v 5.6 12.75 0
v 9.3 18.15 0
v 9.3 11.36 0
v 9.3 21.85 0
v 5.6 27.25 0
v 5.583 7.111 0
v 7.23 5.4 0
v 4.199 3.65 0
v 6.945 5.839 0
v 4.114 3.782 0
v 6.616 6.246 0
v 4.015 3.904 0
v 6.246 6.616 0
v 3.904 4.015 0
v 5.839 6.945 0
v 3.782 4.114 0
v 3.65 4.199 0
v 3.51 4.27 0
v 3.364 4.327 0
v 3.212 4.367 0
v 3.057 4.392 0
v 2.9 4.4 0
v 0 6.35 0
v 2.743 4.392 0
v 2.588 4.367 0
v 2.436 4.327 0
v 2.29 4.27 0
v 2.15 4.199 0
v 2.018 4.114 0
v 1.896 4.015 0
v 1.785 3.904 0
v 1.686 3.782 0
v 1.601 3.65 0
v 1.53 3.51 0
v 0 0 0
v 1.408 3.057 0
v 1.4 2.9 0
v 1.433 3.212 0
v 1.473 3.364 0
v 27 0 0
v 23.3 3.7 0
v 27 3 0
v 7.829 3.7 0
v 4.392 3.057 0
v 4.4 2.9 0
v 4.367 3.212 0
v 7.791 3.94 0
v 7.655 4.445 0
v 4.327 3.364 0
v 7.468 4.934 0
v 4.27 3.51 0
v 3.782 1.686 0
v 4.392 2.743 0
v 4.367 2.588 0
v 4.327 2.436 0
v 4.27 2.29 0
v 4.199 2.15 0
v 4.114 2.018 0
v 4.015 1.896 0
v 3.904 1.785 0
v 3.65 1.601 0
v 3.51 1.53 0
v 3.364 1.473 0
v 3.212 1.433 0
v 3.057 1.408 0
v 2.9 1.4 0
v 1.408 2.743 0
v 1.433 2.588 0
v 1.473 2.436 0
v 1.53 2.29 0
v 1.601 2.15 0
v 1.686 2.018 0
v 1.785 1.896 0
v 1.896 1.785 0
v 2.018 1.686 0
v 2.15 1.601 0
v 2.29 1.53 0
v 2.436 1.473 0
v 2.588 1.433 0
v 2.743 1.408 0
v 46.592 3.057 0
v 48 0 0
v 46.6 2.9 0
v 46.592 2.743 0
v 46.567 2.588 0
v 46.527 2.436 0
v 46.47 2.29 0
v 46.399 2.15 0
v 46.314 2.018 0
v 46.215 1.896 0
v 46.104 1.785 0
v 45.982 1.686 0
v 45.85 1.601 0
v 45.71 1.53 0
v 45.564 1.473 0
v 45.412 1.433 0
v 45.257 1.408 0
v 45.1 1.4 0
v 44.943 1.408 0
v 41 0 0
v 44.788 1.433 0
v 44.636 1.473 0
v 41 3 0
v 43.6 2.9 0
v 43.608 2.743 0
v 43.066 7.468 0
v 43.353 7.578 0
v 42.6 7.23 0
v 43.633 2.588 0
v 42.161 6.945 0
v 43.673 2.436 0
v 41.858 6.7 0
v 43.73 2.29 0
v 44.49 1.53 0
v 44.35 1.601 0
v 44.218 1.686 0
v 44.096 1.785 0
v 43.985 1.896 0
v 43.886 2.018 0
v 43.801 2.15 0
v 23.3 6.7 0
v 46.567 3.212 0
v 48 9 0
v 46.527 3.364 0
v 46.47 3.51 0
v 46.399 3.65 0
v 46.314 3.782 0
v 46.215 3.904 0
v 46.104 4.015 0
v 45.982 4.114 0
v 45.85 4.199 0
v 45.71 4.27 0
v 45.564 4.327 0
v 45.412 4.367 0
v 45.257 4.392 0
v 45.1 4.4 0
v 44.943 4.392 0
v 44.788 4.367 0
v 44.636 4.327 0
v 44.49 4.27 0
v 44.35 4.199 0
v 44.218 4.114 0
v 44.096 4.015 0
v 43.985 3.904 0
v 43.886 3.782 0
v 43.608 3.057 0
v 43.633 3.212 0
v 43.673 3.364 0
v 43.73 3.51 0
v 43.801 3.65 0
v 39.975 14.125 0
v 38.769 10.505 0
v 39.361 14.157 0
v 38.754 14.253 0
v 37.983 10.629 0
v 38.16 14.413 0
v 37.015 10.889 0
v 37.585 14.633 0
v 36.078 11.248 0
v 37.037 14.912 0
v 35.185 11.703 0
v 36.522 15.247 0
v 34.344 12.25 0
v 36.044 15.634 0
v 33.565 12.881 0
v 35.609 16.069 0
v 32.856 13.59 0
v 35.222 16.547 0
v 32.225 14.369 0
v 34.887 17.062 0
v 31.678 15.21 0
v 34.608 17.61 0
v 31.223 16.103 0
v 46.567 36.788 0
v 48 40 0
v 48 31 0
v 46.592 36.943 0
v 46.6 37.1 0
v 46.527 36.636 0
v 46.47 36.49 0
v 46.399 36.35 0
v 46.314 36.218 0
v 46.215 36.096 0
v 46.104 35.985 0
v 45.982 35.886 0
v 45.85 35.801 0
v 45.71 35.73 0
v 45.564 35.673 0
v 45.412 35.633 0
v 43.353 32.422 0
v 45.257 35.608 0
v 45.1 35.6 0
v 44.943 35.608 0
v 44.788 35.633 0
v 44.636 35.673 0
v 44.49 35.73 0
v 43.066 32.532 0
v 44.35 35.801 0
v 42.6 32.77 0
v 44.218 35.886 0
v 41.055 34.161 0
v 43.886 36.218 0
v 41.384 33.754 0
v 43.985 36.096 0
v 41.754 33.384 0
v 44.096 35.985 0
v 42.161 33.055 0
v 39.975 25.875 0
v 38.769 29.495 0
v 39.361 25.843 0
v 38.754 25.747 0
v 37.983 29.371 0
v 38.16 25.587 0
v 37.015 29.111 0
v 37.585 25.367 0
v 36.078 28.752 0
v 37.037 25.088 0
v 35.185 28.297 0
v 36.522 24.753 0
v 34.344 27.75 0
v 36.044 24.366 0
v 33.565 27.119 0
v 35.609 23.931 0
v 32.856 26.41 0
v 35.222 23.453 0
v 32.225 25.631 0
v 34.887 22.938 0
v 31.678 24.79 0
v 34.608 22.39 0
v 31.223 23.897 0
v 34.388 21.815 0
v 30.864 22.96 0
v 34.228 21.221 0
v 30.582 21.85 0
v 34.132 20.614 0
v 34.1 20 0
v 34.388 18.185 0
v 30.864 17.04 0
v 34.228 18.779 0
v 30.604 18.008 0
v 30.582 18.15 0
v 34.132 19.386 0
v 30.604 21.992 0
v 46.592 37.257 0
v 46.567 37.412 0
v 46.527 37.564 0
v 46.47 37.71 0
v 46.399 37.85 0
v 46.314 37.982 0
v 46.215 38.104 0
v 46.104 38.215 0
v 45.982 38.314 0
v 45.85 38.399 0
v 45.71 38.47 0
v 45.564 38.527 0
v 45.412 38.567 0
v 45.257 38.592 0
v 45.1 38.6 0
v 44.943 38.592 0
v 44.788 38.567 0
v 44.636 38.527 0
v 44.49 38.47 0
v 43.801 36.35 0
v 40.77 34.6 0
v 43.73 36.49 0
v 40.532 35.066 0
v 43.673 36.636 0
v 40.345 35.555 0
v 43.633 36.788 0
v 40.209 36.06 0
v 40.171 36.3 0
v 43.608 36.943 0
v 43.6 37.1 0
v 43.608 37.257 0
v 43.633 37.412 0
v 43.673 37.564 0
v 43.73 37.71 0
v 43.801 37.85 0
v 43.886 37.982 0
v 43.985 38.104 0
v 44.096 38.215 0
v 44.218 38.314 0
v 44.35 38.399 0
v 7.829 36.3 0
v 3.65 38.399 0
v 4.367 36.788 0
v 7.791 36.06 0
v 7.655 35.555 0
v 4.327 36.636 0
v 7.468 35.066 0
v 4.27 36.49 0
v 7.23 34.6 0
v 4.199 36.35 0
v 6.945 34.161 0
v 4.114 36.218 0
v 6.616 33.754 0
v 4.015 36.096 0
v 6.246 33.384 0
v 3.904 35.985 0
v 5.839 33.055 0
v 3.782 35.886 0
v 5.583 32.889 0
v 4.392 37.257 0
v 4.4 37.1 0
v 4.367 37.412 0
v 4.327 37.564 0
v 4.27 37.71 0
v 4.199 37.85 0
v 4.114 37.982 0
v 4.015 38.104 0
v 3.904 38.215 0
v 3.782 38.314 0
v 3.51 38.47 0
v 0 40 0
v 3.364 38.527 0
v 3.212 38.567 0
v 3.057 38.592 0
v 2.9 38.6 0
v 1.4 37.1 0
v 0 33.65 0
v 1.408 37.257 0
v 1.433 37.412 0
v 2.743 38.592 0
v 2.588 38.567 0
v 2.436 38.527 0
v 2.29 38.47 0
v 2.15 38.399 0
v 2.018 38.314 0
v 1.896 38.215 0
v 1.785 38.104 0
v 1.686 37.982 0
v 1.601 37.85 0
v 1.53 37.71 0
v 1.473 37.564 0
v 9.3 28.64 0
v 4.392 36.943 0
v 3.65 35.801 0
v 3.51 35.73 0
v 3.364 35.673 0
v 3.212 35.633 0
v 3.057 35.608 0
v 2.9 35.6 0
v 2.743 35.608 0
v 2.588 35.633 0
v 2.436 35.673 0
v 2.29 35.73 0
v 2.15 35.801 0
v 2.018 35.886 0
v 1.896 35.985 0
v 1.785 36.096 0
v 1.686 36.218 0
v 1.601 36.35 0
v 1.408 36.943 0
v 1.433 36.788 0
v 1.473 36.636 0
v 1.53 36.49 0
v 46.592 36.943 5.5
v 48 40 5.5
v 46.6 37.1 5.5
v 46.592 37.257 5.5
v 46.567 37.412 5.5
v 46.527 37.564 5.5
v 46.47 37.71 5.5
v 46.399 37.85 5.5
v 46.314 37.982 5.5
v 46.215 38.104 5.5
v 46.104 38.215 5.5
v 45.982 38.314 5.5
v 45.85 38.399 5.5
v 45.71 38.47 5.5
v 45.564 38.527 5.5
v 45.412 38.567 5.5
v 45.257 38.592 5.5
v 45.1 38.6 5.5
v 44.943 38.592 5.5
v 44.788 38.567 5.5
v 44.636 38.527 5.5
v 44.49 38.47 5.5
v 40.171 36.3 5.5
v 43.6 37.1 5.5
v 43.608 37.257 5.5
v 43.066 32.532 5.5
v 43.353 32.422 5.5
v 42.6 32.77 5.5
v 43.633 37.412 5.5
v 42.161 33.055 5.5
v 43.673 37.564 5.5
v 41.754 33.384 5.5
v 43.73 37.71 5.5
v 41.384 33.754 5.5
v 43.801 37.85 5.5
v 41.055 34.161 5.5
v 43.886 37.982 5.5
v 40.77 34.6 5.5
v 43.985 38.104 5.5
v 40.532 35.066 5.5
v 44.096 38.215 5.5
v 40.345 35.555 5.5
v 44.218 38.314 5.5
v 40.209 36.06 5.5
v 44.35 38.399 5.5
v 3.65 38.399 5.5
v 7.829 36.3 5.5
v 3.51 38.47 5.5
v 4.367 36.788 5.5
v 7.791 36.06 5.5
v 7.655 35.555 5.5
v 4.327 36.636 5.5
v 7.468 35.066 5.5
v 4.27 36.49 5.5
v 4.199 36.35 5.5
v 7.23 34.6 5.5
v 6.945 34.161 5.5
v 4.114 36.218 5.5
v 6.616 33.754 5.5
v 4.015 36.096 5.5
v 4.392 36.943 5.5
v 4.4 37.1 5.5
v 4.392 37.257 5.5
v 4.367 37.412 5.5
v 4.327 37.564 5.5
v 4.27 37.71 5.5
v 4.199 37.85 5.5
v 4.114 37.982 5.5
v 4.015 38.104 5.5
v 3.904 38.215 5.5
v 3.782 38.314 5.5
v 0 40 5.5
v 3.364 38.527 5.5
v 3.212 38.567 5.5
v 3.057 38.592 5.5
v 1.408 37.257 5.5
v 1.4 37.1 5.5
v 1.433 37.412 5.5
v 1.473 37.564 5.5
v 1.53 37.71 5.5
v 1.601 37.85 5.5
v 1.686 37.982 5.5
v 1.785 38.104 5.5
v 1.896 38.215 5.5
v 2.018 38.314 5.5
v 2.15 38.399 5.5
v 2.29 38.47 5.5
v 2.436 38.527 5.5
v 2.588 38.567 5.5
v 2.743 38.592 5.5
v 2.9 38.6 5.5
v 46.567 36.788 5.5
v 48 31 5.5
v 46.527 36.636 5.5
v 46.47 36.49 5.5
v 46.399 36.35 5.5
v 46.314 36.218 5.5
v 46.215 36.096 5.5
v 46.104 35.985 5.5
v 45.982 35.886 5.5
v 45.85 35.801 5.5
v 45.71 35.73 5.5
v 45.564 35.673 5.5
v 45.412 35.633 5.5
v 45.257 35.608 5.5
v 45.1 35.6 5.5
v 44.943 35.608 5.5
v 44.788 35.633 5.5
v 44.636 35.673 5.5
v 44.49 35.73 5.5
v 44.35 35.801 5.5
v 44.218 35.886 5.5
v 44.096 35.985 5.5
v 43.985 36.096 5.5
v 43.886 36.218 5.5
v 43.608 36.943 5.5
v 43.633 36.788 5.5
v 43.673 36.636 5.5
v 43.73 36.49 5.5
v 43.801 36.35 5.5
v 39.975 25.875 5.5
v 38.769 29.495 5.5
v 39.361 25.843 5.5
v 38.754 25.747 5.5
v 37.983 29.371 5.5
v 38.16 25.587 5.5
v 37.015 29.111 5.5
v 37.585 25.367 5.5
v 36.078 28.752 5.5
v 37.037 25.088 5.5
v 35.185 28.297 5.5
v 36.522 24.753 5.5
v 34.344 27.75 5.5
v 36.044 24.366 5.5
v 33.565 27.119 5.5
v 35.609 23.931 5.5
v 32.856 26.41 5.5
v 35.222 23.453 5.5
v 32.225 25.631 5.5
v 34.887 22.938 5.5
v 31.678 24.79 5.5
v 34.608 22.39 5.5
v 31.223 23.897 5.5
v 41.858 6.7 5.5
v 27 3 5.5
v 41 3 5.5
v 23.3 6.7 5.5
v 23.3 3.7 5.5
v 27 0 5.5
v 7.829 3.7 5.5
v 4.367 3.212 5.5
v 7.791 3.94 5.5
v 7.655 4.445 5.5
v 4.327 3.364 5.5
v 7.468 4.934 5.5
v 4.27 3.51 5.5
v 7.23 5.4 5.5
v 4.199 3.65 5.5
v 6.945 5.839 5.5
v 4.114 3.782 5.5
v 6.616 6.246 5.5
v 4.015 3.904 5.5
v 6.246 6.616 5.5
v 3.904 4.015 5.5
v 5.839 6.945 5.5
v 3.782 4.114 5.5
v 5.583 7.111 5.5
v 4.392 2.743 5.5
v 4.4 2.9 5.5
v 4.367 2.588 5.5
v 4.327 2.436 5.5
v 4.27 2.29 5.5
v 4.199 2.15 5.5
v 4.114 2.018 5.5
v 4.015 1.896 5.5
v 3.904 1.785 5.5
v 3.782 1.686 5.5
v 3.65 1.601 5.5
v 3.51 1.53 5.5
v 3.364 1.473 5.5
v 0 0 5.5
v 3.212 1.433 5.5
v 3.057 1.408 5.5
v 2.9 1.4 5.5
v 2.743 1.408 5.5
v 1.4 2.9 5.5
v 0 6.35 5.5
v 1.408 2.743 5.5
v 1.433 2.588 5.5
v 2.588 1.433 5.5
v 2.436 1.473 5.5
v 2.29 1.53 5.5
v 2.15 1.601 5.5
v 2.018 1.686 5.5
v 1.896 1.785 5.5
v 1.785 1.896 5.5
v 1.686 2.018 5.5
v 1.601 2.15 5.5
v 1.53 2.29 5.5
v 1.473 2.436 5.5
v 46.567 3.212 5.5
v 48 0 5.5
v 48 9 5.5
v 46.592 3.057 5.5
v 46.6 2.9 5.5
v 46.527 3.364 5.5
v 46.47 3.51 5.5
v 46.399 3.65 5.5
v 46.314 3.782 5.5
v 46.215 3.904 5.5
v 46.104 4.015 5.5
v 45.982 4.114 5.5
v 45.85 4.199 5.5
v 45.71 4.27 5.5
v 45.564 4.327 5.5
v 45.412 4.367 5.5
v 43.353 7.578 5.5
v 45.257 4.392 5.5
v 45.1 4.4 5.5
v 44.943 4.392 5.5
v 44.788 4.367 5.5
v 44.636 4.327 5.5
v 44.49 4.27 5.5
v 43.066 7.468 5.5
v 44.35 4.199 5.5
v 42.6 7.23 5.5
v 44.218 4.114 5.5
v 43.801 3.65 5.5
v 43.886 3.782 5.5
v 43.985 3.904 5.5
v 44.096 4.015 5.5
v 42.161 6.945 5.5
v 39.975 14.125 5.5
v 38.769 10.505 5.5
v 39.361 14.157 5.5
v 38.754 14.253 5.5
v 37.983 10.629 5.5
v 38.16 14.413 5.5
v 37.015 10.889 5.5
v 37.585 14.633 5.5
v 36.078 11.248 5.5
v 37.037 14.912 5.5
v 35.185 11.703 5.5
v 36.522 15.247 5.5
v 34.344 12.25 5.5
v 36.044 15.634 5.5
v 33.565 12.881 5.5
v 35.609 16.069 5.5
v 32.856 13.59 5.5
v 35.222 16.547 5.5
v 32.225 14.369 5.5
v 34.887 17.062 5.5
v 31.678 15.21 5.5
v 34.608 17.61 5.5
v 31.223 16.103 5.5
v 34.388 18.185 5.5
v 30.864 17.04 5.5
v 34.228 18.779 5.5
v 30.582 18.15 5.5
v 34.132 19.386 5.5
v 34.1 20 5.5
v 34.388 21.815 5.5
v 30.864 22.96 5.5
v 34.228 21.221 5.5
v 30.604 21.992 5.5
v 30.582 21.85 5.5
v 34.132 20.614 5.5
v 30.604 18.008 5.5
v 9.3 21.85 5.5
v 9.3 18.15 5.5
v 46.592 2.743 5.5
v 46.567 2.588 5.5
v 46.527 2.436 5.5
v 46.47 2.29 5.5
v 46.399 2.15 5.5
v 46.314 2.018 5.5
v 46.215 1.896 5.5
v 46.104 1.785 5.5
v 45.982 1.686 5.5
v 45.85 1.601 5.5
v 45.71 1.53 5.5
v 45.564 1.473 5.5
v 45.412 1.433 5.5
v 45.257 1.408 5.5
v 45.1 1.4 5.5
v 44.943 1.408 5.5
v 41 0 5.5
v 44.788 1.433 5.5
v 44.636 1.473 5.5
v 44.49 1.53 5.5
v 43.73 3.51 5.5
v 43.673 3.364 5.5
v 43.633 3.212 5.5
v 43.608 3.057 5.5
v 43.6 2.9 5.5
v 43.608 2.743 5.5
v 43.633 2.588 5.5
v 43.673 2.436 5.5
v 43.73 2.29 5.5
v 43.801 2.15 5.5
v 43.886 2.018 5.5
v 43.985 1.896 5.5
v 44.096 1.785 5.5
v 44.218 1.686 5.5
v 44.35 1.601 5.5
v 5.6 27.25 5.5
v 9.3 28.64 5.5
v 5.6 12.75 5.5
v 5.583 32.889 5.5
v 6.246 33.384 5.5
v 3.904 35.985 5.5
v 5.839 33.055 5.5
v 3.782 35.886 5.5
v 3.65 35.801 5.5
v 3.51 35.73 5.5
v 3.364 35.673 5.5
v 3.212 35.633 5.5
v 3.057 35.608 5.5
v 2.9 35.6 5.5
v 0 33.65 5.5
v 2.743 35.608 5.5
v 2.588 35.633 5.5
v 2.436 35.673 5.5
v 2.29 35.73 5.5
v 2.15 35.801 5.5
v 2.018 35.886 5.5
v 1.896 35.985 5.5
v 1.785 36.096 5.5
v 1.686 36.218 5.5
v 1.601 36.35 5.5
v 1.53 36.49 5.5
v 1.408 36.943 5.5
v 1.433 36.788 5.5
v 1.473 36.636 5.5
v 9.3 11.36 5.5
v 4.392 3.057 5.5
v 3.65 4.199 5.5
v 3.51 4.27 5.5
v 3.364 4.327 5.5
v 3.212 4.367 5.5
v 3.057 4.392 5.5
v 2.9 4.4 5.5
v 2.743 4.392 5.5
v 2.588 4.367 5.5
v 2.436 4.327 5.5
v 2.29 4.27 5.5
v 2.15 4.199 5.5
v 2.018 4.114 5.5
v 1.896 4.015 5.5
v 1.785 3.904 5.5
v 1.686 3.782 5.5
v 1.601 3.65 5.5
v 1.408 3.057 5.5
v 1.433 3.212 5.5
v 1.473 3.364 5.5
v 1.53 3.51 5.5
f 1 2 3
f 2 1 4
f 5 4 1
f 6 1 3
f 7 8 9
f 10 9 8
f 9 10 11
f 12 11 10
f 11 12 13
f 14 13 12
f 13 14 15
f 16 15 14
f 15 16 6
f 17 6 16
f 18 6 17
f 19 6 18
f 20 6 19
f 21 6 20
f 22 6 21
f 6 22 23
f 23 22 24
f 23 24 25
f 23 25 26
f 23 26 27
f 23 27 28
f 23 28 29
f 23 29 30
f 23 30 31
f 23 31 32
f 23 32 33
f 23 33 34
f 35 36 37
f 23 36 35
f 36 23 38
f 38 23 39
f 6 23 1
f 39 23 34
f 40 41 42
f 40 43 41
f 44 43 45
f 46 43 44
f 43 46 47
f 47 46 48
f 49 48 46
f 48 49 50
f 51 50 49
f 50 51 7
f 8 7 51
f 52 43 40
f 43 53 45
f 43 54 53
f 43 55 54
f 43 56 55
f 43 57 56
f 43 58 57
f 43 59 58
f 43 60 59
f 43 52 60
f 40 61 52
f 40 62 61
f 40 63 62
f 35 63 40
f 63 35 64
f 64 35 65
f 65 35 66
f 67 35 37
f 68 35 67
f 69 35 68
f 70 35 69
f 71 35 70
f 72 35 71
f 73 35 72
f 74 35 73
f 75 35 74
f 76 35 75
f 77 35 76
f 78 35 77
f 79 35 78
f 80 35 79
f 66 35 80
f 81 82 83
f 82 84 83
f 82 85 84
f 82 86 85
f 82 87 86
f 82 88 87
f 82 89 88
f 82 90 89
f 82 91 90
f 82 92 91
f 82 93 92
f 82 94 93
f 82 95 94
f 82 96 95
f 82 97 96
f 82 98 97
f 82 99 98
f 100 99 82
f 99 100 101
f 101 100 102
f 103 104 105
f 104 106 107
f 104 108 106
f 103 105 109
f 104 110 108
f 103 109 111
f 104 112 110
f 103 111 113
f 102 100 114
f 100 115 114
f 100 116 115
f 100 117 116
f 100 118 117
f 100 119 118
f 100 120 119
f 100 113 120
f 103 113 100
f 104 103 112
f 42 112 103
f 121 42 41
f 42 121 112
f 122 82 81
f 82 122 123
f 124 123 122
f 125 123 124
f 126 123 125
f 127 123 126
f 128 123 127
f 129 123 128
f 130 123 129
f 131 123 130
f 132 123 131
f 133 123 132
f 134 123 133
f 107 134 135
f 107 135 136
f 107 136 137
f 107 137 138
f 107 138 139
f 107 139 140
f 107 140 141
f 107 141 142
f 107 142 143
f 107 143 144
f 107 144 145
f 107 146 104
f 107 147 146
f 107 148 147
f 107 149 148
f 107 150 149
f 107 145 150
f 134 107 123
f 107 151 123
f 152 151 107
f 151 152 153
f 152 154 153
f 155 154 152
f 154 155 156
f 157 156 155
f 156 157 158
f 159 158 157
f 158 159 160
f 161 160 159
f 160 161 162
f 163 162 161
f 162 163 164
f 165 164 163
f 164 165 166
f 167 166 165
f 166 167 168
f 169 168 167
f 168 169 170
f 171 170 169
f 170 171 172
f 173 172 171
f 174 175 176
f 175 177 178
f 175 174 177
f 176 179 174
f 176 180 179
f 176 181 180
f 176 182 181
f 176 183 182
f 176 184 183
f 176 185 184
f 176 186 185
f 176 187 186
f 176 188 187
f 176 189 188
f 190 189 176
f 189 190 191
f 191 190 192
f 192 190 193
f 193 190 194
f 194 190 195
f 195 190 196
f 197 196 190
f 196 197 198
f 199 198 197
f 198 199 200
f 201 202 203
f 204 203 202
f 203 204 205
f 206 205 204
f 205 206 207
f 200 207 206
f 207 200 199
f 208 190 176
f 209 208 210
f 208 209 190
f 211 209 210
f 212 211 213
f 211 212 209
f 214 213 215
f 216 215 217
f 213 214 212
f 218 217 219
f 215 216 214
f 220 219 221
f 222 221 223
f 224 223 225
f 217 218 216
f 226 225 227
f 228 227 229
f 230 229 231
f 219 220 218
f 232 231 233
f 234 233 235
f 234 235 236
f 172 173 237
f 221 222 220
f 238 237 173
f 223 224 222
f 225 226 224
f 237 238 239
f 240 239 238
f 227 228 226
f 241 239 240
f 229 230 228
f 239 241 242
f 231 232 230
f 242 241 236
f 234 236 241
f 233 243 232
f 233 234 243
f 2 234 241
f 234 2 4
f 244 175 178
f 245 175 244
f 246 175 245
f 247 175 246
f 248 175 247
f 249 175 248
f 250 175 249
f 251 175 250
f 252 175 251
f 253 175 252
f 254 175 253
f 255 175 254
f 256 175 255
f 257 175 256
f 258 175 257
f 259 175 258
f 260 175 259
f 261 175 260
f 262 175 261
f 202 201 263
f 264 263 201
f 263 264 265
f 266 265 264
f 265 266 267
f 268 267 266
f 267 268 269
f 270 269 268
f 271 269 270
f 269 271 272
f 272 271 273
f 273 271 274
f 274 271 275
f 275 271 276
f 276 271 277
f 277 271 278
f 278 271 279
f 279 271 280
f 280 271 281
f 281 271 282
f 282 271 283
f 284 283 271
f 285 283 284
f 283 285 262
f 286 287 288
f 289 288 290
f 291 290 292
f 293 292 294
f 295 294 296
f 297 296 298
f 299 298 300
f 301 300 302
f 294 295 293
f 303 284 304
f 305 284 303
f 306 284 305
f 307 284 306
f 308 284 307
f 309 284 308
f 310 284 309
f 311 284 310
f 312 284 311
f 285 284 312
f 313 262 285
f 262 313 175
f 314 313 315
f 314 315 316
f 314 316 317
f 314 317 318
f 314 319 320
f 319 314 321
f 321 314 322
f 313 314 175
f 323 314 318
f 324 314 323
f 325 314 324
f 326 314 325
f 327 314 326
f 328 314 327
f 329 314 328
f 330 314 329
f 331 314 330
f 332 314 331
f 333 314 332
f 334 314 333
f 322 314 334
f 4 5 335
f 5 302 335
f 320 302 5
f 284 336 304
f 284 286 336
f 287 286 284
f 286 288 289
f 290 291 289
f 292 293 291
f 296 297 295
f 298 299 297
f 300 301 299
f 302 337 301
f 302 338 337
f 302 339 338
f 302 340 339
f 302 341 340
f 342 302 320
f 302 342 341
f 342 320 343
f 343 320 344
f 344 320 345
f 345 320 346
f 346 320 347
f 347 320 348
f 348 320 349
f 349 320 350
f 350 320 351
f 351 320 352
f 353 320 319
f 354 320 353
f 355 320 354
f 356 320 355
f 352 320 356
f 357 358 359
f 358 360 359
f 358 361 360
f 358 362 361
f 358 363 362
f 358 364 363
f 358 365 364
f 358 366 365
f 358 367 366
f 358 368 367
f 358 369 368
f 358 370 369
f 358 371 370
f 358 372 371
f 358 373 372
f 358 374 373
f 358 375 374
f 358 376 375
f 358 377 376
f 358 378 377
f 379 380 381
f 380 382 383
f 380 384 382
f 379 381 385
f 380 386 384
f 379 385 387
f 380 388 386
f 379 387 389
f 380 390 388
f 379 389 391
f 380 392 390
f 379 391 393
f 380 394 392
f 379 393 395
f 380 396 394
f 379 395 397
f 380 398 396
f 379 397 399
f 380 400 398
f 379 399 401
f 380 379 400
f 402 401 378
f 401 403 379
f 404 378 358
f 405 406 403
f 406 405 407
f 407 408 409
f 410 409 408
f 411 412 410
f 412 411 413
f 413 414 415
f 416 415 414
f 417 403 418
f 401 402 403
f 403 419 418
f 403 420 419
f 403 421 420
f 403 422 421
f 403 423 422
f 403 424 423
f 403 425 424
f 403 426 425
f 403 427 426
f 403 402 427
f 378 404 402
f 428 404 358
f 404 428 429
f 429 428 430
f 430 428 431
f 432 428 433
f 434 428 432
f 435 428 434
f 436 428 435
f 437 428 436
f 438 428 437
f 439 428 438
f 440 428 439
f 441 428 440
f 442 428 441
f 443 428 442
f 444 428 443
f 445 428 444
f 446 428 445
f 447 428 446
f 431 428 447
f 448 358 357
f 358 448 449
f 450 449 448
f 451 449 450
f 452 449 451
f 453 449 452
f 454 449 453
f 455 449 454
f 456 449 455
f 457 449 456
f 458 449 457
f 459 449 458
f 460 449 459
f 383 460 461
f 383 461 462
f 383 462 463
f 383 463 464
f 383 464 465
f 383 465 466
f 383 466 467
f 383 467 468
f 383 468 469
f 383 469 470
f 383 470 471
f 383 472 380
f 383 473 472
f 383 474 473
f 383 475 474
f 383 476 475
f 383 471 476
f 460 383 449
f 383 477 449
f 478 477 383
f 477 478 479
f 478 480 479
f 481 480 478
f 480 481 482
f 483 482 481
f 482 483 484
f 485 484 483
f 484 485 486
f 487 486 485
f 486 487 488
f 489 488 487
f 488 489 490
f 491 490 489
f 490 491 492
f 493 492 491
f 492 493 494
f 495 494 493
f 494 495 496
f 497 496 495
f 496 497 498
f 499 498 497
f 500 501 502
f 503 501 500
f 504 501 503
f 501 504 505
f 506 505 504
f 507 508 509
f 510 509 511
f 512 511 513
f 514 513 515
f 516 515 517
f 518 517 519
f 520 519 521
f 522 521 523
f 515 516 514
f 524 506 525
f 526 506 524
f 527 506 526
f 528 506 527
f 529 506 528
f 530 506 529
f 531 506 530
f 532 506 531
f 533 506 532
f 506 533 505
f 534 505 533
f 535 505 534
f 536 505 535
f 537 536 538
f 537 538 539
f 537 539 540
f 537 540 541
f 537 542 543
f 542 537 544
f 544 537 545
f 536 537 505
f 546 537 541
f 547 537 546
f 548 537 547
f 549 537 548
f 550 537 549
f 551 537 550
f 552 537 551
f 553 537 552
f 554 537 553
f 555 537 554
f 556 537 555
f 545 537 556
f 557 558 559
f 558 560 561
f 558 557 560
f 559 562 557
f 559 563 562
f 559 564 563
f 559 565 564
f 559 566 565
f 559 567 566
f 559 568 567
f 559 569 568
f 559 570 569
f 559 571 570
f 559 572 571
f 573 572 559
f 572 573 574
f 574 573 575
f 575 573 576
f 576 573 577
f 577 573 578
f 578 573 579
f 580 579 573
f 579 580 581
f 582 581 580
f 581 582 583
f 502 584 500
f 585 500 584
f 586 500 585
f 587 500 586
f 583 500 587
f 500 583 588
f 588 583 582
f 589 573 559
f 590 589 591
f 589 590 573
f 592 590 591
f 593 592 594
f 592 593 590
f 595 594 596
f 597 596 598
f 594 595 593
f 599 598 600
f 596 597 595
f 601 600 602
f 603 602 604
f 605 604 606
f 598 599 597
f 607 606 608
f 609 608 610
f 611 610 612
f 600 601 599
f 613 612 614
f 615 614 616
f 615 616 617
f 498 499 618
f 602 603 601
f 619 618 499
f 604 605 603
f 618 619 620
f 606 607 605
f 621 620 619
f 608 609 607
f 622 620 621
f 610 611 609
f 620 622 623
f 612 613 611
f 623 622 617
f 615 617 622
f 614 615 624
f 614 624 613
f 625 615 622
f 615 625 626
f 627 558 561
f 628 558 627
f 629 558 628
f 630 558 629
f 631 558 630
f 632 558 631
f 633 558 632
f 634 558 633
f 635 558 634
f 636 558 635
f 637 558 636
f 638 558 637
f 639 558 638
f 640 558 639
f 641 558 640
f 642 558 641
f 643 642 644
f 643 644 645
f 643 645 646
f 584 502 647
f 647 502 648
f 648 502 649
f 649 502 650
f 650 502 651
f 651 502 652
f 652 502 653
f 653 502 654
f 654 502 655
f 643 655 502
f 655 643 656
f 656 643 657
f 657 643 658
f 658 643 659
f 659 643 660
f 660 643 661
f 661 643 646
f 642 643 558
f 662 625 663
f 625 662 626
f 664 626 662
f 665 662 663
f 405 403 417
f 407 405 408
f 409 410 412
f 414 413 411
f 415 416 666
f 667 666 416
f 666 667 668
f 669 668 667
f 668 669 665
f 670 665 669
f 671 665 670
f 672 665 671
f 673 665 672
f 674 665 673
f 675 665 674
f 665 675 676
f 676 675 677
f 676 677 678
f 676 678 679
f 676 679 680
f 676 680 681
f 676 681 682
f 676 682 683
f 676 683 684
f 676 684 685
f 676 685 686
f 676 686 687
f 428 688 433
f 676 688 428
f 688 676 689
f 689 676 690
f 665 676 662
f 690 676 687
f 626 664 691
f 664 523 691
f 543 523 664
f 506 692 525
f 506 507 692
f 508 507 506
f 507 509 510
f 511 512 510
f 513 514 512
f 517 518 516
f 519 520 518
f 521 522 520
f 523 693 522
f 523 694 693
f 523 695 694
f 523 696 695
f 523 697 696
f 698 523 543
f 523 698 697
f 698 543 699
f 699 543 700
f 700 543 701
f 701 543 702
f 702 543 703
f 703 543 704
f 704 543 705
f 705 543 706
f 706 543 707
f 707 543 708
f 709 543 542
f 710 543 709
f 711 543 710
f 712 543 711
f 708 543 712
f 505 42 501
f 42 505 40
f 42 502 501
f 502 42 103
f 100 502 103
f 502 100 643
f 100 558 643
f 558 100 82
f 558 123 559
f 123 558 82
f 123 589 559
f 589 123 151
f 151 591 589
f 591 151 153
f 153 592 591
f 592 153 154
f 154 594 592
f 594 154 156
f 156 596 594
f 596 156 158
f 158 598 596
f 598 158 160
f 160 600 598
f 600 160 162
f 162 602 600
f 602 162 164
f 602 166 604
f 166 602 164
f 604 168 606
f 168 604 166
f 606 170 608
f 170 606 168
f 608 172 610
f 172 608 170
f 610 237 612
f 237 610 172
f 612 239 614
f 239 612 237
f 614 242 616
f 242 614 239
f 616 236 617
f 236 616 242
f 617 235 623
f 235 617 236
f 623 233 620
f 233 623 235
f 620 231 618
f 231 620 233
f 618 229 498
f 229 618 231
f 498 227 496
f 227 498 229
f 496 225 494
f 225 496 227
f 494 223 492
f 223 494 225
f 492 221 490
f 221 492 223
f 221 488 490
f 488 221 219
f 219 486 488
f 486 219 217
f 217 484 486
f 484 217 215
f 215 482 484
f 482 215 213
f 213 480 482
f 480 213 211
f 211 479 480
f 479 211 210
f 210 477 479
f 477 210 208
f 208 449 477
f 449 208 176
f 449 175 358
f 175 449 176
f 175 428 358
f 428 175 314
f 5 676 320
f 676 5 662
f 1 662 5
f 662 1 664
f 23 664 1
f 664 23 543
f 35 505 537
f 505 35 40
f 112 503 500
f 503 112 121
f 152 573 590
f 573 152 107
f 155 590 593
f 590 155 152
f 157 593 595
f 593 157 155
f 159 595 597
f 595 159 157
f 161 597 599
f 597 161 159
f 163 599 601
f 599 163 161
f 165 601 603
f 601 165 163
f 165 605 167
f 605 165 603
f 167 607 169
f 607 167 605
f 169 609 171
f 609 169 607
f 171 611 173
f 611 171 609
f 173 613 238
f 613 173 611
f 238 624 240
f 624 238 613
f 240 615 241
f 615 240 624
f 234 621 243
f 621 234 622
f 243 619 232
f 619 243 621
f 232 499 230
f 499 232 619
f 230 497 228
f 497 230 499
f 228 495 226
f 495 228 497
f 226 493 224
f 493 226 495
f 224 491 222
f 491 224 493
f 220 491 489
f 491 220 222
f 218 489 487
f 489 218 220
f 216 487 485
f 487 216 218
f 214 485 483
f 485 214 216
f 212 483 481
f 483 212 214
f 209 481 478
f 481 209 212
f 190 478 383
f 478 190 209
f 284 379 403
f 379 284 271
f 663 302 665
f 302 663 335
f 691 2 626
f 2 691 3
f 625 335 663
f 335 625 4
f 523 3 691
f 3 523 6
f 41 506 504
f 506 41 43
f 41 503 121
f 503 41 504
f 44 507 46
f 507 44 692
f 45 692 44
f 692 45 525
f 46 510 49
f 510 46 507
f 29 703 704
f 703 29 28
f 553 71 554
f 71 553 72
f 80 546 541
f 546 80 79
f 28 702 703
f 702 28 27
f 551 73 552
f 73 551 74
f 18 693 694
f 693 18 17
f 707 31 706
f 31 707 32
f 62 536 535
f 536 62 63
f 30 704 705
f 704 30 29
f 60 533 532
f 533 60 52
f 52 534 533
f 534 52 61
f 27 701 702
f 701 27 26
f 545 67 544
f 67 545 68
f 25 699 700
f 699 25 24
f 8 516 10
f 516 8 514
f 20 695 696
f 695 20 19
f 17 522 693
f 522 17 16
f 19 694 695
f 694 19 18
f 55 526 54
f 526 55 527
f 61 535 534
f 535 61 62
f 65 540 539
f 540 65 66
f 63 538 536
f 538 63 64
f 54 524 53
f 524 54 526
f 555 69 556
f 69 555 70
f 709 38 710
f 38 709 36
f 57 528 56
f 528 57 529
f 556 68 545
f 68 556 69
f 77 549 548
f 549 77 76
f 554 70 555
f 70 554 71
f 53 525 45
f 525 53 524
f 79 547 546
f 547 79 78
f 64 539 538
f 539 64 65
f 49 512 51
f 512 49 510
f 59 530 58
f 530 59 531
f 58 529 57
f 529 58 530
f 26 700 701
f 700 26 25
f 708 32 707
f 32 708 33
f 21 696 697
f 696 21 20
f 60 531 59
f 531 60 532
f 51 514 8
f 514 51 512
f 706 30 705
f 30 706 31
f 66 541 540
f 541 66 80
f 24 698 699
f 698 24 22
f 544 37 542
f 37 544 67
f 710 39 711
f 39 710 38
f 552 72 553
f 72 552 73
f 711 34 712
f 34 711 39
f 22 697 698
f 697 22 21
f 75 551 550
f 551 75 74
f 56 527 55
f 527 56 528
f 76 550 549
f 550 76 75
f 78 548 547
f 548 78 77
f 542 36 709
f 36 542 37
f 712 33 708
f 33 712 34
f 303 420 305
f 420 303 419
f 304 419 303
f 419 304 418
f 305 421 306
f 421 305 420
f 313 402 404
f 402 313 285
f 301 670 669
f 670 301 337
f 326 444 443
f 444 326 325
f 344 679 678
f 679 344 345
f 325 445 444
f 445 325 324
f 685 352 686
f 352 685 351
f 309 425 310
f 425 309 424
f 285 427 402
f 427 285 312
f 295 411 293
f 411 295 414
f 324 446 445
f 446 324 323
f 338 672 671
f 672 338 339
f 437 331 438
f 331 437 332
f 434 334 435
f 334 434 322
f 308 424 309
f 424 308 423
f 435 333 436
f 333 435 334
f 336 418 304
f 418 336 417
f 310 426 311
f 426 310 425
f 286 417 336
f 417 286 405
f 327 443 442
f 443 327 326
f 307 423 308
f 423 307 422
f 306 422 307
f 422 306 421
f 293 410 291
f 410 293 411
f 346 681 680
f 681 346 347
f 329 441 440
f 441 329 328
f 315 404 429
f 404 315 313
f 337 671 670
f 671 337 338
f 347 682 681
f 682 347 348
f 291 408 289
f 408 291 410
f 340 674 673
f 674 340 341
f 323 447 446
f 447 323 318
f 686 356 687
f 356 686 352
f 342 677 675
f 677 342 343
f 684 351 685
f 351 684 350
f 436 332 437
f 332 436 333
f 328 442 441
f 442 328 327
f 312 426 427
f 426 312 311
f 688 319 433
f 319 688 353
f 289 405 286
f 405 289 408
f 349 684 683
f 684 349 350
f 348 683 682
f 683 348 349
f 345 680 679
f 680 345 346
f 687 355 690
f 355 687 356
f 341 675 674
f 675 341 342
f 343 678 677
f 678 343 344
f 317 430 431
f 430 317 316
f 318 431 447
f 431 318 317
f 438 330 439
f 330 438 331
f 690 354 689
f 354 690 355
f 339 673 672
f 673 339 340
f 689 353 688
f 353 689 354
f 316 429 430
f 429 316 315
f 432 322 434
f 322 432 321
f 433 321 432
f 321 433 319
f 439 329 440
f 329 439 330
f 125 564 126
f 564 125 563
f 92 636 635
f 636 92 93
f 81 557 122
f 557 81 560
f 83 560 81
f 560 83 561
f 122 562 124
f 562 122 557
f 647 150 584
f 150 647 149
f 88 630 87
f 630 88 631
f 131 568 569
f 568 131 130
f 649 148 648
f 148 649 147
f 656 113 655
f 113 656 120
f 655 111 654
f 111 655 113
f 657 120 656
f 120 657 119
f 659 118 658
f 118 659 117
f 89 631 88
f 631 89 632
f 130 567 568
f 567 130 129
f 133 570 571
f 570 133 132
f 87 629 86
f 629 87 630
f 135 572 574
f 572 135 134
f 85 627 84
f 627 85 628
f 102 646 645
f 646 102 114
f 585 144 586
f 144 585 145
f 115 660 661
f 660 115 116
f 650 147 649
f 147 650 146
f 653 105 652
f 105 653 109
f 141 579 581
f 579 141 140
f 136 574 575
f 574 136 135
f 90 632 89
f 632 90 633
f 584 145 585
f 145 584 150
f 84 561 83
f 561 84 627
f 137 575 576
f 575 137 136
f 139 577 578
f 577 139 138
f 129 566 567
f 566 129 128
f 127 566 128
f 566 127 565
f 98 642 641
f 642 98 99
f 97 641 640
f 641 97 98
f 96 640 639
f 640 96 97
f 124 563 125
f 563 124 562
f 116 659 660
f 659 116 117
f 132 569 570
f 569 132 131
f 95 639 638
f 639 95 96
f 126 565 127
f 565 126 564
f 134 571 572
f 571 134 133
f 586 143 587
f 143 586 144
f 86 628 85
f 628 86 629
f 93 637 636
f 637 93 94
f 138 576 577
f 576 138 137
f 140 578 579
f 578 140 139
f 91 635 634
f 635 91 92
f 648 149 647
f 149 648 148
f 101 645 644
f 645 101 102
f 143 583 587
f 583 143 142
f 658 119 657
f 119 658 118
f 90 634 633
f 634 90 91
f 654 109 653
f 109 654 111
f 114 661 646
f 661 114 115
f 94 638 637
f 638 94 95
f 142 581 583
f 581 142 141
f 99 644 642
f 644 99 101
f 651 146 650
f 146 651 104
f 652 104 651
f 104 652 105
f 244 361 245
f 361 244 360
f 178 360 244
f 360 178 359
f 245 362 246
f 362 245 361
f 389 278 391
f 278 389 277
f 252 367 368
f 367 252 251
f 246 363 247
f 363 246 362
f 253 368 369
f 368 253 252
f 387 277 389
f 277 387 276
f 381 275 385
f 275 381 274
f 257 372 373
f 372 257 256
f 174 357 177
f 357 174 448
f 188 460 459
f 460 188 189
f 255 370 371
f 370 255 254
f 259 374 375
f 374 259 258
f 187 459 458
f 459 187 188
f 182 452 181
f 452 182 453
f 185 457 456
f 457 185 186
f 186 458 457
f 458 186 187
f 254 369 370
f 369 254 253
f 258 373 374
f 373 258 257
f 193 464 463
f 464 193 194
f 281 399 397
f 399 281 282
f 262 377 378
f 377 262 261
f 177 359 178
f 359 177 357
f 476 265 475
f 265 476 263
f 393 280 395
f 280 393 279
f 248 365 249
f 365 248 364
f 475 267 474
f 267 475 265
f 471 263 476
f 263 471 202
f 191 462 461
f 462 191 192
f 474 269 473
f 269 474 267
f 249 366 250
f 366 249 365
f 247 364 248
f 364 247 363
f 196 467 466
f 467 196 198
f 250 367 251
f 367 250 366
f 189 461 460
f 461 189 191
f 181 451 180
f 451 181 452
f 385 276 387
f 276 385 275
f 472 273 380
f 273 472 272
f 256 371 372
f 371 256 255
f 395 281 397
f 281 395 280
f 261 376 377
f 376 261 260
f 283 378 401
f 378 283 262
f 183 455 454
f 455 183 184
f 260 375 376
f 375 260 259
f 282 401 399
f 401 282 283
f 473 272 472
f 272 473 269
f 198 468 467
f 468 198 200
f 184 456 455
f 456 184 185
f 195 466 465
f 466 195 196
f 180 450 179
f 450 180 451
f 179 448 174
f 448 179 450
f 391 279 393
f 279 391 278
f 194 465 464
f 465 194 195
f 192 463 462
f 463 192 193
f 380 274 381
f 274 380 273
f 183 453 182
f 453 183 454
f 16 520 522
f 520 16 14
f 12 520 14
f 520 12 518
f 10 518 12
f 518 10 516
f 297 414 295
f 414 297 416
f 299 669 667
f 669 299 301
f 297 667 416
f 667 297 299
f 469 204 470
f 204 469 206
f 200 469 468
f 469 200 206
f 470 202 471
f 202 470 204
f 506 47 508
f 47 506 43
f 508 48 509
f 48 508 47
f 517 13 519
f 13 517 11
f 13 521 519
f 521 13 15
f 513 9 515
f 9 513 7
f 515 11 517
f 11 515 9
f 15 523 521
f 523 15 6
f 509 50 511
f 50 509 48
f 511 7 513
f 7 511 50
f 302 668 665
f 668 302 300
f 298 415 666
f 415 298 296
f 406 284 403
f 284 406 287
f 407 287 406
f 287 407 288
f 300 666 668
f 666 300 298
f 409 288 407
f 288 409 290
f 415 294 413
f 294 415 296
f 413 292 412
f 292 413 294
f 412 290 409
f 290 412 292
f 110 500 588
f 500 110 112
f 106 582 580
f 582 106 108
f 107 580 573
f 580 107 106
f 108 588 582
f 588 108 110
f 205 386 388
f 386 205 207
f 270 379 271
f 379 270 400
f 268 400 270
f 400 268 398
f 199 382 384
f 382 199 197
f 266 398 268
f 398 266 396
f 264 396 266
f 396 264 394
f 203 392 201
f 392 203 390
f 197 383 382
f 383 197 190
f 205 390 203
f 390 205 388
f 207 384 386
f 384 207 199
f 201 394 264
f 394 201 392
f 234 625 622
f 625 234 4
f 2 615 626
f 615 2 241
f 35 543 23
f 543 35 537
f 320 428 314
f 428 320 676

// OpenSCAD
$fn = 60;

main=[48,40];
side=[14,3];
usbTrap = [5.6, 14.5, 27.3]; // trapezoidHeight, shortLenght, longLength
nutSlotDia = 11.75;
nutSlotEdgeOffset = 13.9;
nutTrap = [nutSlotEdgeOffset-nutSlotDia/2, nutSlotDia, 22];

module mainPolygon() {
    polygon(points = [ [0,0], [main[0],0], [main[0],main[1]], [0,main[1]] ]);
};

module sidePolygon() {
    polygon(points = [ [0,0], [side[0],0], [side[0],side[1]], [0,side[1]] ]);
};

module trapezoid(dimensions=usbTrap) {
    inset = (dimensions[2]-dimensions[1])/2;
    polygon(points = [ [0,0], [dimensions[0],inset], [dimensions[0],inset+dimensions[1]], [0,dimensions[2]] ]);
};

module nutSlot(d=nutSlotDia) {
   circle(d=d);
}
//nutSlot();

module outputPolygon() {
    difference() {
        mainPolygon();
        translate([main[0]-21, 0, 0]) sidePolygon();
        translate([0,(main[1]-usbTrap[2])/2, 0]) trapezoid(usbTrap);
        translate([main[0],(main[1]-nutTrap[2])/2, 0]) rotate([0,180,0]) trapezoid(nutTrap);
        translate([main[0]-nutSlotEdgeOffset+nutSlotDia/2,main[1]/2,0]) nutSlot();
    }
};
//outputPolygon();

//pang-cut ito ng sosobrang cylinder ng mounting hole
module boundingWall(size=main, thickness=7, h=wallHeight) {
    linear_extrude(height=h) {
        difference() {
            offset(delta=thickness) outputPolygon();
            outputPolygon();
        };
    };
};
//boundingWall();

insetLength = 3.7;
module insetOutputPolygon(inset=insetLength) {
    offset(delta=-inset) {
        outputPolygon();
    };
};
//insetOutputPolygon();

wallHeight = 5.5;
module perimeterExtrude(h=wallHeight) {
    difference() {
        linear_extrude(height=h) { outputPolygon(); }
        linear_extrude(height=h) { insetOutputPolygon(); }
    }
}
//perimeterExtrude();

mountHoleEdgeOffset = 1.4;
mountHoleDiameter = 3;
holeGaps = [main[0]-mountHoleEdgeOffset*2-mountHoleDiameter, main[1]-mountHoleEdgeOffset*2-mountHoleDiameter];
//echo(holeGaps);
module mounts(gaps=holeGaps, d=mountHoleDiameter, h=wallHeight, o=mountHoleEdgeOffset) {
    for (x = [0, gaps[0]], y = [0, gaps[1]]) {
            translate([x,y,0]) cylinder(d=d, h=h);
    };
};
//mounts();

// cylinder around mounts
//outerCylinderDiameter = mountHoleDiameter+mountHoleEdgeOffset*2;
outerCylinderDiameter = 10;
module mountCylinders(d=outerCylinderDiameter, h=wallHeight) {
    difference() {
        mounts(d=d, h=h);
        mounts(h=h);
        //translate([x,y,0]) cylinder(d=d+o*2, h=h);
    };
};
//mountCylinders();

module spine(t=insetLength, h=wallHeight) {
   cube([main[0]-nutSlotEdgeOffset, t, h]);
};
//spine();

finalMountOffset = mountHoleEdgeOffset + mountHoleDiameter/2;
module pcbBackplate(o=finalMountOffset, h=wallHeight) {
    difference() {
        union() {
            difference() {
                perimeterExtrude(h=h);
                translate([o, o, 0]) mounts(h=h); 
            };
            translate([o, o, 0]) mountCylinders(h=h);
            translate([0, (main[1]-insetLength)/2, 0]) spine(t=insetLength, h=h);
        };
        boundingWall(h=h);
    };
}

pcbBackplate();
